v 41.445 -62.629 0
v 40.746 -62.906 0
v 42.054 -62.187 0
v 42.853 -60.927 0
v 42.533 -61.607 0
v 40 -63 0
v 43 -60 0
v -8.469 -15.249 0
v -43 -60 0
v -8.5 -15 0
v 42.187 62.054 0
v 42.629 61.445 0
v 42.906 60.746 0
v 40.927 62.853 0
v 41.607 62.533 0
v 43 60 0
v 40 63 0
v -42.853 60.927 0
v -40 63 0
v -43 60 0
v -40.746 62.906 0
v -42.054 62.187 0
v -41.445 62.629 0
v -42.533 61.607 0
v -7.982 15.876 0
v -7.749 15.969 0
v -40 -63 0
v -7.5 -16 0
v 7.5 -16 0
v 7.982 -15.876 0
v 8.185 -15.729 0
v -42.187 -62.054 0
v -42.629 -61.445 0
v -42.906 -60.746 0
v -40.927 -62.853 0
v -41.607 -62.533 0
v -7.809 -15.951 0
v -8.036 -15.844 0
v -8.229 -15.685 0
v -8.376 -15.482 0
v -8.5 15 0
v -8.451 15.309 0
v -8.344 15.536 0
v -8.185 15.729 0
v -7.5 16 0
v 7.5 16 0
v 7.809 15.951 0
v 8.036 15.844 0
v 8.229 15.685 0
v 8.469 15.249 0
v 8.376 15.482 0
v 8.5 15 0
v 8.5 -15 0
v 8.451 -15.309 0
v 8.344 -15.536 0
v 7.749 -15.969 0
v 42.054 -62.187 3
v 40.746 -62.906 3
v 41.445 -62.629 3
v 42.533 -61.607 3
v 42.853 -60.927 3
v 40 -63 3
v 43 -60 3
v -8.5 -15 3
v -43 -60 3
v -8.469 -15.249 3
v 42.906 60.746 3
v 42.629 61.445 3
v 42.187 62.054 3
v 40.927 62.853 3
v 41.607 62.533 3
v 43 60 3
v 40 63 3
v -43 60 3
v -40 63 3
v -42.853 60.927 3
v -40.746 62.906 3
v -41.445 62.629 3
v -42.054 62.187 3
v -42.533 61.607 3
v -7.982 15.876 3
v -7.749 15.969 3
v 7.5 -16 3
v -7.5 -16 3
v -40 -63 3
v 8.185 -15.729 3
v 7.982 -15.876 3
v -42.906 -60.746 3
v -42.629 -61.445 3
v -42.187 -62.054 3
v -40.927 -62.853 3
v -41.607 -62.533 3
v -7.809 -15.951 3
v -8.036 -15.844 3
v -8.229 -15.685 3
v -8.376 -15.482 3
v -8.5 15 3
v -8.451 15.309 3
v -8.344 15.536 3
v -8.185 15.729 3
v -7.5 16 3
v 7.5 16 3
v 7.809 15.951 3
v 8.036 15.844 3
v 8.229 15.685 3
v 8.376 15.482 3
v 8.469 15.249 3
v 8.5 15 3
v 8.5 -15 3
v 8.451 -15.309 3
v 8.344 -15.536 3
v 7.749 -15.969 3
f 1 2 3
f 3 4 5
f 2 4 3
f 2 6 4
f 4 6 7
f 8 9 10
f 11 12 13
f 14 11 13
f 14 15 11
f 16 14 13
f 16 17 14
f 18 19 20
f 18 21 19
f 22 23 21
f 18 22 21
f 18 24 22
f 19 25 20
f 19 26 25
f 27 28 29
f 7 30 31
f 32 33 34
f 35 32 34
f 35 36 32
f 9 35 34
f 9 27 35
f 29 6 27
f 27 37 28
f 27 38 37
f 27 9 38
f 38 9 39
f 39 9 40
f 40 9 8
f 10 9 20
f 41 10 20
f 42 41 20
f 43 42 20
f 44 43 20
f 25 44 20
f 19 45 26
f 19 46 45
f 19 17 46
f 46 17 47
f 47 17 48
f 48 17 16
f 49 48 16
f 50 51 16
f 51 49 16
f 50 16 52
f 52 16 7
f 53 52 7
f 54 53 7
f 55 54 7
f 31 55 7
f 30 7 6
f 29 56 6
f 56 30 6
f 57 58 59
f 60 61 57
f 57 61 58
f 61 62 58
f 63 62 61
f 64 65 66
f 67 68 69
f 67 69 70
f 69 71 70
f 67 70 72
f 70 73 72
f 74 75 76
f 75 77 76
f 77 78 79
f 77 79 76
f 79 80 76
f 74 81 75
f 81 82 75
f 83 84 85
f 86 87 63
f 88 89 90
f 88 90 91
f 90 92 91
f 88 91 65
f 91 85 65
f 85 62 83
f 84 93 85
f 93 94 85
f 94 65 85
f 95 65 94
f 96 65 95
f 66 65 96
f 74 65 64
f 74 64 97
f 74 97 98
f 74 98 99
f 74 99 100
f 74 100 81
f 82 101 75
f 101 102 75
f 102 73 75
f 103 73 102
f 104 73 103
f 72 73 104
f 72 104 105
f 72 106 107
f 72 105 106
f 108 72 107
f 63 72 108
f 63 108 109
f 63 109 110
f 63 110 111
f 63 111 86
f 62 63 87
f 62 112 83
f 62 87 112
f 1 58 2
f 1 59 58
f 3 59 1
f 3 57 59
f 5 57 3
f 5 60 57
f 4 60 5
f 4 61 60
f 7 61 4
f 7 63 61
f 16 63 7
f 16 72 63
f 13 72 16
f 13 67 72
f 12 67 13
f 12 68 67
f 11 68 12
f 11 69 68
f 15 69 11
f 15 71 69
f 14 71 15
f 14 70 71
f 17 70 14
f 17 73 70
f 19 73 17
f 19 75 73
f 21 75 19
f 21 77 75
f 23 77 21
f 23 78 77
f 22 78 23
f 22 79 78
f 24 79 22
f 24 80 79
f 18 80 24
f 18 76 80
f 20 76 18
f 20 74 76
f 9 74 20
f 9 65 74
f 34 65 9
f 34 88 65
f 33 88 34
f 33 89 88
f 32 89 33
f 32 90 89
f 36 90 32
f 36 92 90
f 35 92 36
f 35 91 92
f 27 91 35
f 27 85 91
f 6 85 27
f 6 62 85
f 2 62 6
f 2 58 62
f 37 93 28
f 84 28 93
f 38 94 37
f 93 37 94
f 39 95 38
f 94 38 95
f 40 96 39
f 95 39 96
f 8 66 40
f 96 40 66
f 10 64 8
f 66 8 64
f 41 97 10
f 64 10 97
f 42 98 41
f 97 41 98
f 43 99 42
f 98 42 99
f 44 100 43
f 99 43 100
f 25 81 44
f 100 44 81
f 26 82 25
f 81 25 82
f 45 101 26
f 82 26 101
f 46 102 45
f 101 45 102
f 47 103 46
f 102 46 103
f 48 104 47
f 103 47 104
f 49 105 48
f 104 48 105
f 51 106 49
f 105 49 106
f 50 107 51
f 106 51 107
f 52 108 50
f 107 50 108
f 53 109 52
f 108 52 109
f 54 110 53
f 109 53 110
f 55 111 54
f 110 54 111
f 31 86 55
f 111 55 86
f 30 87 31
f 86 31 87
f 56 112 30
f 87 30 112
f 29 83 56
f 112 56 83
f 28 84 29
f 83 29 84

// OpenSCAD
$fn=25;
BOX_W = 80; // Box Width
BOX_L = 120;// Box Length
BOX_H = 3; // Box Height
SCREW_SIZE = 1.5; // Screw size radius.

CORNER_RADIUS = 3; // Radius of corners
WALL_THICKNESS = 2;// Wall Thickness
//square( [BOX_W, BOX_L] );
//offset(r=CORNER_RADIUS) square( [BOX_W, BOX_L] );


linear_extrude( BOX_H )
    difference(){
        offset(r=CORNER_RADIUS) 
            square( [BOX_W, BOX_L], center=true );
        
        offset( r= CORNER_RADIUS - WALL_THICKNESS )
            square( [15, 30], center=true );
        
        
        
    }




coordinates = [ [0,0],[0,BOX_L],[BOX_W,BOX_L],[BOX_W,0] ];

//translate ( [-BOX_W/2, -BOX_L/2] )
//    hull()
//    for (i = coordinates)
 //       translate(i) sphere(CORNER_RADIUS);
    
    
    
    
    
    
/*    
translate ( [-BOX_W/2, -BOX_L/2] )
hull()
for (i = coordinates)
    translate(i) sphere(CORNER_RADIUS);

  */  
    
